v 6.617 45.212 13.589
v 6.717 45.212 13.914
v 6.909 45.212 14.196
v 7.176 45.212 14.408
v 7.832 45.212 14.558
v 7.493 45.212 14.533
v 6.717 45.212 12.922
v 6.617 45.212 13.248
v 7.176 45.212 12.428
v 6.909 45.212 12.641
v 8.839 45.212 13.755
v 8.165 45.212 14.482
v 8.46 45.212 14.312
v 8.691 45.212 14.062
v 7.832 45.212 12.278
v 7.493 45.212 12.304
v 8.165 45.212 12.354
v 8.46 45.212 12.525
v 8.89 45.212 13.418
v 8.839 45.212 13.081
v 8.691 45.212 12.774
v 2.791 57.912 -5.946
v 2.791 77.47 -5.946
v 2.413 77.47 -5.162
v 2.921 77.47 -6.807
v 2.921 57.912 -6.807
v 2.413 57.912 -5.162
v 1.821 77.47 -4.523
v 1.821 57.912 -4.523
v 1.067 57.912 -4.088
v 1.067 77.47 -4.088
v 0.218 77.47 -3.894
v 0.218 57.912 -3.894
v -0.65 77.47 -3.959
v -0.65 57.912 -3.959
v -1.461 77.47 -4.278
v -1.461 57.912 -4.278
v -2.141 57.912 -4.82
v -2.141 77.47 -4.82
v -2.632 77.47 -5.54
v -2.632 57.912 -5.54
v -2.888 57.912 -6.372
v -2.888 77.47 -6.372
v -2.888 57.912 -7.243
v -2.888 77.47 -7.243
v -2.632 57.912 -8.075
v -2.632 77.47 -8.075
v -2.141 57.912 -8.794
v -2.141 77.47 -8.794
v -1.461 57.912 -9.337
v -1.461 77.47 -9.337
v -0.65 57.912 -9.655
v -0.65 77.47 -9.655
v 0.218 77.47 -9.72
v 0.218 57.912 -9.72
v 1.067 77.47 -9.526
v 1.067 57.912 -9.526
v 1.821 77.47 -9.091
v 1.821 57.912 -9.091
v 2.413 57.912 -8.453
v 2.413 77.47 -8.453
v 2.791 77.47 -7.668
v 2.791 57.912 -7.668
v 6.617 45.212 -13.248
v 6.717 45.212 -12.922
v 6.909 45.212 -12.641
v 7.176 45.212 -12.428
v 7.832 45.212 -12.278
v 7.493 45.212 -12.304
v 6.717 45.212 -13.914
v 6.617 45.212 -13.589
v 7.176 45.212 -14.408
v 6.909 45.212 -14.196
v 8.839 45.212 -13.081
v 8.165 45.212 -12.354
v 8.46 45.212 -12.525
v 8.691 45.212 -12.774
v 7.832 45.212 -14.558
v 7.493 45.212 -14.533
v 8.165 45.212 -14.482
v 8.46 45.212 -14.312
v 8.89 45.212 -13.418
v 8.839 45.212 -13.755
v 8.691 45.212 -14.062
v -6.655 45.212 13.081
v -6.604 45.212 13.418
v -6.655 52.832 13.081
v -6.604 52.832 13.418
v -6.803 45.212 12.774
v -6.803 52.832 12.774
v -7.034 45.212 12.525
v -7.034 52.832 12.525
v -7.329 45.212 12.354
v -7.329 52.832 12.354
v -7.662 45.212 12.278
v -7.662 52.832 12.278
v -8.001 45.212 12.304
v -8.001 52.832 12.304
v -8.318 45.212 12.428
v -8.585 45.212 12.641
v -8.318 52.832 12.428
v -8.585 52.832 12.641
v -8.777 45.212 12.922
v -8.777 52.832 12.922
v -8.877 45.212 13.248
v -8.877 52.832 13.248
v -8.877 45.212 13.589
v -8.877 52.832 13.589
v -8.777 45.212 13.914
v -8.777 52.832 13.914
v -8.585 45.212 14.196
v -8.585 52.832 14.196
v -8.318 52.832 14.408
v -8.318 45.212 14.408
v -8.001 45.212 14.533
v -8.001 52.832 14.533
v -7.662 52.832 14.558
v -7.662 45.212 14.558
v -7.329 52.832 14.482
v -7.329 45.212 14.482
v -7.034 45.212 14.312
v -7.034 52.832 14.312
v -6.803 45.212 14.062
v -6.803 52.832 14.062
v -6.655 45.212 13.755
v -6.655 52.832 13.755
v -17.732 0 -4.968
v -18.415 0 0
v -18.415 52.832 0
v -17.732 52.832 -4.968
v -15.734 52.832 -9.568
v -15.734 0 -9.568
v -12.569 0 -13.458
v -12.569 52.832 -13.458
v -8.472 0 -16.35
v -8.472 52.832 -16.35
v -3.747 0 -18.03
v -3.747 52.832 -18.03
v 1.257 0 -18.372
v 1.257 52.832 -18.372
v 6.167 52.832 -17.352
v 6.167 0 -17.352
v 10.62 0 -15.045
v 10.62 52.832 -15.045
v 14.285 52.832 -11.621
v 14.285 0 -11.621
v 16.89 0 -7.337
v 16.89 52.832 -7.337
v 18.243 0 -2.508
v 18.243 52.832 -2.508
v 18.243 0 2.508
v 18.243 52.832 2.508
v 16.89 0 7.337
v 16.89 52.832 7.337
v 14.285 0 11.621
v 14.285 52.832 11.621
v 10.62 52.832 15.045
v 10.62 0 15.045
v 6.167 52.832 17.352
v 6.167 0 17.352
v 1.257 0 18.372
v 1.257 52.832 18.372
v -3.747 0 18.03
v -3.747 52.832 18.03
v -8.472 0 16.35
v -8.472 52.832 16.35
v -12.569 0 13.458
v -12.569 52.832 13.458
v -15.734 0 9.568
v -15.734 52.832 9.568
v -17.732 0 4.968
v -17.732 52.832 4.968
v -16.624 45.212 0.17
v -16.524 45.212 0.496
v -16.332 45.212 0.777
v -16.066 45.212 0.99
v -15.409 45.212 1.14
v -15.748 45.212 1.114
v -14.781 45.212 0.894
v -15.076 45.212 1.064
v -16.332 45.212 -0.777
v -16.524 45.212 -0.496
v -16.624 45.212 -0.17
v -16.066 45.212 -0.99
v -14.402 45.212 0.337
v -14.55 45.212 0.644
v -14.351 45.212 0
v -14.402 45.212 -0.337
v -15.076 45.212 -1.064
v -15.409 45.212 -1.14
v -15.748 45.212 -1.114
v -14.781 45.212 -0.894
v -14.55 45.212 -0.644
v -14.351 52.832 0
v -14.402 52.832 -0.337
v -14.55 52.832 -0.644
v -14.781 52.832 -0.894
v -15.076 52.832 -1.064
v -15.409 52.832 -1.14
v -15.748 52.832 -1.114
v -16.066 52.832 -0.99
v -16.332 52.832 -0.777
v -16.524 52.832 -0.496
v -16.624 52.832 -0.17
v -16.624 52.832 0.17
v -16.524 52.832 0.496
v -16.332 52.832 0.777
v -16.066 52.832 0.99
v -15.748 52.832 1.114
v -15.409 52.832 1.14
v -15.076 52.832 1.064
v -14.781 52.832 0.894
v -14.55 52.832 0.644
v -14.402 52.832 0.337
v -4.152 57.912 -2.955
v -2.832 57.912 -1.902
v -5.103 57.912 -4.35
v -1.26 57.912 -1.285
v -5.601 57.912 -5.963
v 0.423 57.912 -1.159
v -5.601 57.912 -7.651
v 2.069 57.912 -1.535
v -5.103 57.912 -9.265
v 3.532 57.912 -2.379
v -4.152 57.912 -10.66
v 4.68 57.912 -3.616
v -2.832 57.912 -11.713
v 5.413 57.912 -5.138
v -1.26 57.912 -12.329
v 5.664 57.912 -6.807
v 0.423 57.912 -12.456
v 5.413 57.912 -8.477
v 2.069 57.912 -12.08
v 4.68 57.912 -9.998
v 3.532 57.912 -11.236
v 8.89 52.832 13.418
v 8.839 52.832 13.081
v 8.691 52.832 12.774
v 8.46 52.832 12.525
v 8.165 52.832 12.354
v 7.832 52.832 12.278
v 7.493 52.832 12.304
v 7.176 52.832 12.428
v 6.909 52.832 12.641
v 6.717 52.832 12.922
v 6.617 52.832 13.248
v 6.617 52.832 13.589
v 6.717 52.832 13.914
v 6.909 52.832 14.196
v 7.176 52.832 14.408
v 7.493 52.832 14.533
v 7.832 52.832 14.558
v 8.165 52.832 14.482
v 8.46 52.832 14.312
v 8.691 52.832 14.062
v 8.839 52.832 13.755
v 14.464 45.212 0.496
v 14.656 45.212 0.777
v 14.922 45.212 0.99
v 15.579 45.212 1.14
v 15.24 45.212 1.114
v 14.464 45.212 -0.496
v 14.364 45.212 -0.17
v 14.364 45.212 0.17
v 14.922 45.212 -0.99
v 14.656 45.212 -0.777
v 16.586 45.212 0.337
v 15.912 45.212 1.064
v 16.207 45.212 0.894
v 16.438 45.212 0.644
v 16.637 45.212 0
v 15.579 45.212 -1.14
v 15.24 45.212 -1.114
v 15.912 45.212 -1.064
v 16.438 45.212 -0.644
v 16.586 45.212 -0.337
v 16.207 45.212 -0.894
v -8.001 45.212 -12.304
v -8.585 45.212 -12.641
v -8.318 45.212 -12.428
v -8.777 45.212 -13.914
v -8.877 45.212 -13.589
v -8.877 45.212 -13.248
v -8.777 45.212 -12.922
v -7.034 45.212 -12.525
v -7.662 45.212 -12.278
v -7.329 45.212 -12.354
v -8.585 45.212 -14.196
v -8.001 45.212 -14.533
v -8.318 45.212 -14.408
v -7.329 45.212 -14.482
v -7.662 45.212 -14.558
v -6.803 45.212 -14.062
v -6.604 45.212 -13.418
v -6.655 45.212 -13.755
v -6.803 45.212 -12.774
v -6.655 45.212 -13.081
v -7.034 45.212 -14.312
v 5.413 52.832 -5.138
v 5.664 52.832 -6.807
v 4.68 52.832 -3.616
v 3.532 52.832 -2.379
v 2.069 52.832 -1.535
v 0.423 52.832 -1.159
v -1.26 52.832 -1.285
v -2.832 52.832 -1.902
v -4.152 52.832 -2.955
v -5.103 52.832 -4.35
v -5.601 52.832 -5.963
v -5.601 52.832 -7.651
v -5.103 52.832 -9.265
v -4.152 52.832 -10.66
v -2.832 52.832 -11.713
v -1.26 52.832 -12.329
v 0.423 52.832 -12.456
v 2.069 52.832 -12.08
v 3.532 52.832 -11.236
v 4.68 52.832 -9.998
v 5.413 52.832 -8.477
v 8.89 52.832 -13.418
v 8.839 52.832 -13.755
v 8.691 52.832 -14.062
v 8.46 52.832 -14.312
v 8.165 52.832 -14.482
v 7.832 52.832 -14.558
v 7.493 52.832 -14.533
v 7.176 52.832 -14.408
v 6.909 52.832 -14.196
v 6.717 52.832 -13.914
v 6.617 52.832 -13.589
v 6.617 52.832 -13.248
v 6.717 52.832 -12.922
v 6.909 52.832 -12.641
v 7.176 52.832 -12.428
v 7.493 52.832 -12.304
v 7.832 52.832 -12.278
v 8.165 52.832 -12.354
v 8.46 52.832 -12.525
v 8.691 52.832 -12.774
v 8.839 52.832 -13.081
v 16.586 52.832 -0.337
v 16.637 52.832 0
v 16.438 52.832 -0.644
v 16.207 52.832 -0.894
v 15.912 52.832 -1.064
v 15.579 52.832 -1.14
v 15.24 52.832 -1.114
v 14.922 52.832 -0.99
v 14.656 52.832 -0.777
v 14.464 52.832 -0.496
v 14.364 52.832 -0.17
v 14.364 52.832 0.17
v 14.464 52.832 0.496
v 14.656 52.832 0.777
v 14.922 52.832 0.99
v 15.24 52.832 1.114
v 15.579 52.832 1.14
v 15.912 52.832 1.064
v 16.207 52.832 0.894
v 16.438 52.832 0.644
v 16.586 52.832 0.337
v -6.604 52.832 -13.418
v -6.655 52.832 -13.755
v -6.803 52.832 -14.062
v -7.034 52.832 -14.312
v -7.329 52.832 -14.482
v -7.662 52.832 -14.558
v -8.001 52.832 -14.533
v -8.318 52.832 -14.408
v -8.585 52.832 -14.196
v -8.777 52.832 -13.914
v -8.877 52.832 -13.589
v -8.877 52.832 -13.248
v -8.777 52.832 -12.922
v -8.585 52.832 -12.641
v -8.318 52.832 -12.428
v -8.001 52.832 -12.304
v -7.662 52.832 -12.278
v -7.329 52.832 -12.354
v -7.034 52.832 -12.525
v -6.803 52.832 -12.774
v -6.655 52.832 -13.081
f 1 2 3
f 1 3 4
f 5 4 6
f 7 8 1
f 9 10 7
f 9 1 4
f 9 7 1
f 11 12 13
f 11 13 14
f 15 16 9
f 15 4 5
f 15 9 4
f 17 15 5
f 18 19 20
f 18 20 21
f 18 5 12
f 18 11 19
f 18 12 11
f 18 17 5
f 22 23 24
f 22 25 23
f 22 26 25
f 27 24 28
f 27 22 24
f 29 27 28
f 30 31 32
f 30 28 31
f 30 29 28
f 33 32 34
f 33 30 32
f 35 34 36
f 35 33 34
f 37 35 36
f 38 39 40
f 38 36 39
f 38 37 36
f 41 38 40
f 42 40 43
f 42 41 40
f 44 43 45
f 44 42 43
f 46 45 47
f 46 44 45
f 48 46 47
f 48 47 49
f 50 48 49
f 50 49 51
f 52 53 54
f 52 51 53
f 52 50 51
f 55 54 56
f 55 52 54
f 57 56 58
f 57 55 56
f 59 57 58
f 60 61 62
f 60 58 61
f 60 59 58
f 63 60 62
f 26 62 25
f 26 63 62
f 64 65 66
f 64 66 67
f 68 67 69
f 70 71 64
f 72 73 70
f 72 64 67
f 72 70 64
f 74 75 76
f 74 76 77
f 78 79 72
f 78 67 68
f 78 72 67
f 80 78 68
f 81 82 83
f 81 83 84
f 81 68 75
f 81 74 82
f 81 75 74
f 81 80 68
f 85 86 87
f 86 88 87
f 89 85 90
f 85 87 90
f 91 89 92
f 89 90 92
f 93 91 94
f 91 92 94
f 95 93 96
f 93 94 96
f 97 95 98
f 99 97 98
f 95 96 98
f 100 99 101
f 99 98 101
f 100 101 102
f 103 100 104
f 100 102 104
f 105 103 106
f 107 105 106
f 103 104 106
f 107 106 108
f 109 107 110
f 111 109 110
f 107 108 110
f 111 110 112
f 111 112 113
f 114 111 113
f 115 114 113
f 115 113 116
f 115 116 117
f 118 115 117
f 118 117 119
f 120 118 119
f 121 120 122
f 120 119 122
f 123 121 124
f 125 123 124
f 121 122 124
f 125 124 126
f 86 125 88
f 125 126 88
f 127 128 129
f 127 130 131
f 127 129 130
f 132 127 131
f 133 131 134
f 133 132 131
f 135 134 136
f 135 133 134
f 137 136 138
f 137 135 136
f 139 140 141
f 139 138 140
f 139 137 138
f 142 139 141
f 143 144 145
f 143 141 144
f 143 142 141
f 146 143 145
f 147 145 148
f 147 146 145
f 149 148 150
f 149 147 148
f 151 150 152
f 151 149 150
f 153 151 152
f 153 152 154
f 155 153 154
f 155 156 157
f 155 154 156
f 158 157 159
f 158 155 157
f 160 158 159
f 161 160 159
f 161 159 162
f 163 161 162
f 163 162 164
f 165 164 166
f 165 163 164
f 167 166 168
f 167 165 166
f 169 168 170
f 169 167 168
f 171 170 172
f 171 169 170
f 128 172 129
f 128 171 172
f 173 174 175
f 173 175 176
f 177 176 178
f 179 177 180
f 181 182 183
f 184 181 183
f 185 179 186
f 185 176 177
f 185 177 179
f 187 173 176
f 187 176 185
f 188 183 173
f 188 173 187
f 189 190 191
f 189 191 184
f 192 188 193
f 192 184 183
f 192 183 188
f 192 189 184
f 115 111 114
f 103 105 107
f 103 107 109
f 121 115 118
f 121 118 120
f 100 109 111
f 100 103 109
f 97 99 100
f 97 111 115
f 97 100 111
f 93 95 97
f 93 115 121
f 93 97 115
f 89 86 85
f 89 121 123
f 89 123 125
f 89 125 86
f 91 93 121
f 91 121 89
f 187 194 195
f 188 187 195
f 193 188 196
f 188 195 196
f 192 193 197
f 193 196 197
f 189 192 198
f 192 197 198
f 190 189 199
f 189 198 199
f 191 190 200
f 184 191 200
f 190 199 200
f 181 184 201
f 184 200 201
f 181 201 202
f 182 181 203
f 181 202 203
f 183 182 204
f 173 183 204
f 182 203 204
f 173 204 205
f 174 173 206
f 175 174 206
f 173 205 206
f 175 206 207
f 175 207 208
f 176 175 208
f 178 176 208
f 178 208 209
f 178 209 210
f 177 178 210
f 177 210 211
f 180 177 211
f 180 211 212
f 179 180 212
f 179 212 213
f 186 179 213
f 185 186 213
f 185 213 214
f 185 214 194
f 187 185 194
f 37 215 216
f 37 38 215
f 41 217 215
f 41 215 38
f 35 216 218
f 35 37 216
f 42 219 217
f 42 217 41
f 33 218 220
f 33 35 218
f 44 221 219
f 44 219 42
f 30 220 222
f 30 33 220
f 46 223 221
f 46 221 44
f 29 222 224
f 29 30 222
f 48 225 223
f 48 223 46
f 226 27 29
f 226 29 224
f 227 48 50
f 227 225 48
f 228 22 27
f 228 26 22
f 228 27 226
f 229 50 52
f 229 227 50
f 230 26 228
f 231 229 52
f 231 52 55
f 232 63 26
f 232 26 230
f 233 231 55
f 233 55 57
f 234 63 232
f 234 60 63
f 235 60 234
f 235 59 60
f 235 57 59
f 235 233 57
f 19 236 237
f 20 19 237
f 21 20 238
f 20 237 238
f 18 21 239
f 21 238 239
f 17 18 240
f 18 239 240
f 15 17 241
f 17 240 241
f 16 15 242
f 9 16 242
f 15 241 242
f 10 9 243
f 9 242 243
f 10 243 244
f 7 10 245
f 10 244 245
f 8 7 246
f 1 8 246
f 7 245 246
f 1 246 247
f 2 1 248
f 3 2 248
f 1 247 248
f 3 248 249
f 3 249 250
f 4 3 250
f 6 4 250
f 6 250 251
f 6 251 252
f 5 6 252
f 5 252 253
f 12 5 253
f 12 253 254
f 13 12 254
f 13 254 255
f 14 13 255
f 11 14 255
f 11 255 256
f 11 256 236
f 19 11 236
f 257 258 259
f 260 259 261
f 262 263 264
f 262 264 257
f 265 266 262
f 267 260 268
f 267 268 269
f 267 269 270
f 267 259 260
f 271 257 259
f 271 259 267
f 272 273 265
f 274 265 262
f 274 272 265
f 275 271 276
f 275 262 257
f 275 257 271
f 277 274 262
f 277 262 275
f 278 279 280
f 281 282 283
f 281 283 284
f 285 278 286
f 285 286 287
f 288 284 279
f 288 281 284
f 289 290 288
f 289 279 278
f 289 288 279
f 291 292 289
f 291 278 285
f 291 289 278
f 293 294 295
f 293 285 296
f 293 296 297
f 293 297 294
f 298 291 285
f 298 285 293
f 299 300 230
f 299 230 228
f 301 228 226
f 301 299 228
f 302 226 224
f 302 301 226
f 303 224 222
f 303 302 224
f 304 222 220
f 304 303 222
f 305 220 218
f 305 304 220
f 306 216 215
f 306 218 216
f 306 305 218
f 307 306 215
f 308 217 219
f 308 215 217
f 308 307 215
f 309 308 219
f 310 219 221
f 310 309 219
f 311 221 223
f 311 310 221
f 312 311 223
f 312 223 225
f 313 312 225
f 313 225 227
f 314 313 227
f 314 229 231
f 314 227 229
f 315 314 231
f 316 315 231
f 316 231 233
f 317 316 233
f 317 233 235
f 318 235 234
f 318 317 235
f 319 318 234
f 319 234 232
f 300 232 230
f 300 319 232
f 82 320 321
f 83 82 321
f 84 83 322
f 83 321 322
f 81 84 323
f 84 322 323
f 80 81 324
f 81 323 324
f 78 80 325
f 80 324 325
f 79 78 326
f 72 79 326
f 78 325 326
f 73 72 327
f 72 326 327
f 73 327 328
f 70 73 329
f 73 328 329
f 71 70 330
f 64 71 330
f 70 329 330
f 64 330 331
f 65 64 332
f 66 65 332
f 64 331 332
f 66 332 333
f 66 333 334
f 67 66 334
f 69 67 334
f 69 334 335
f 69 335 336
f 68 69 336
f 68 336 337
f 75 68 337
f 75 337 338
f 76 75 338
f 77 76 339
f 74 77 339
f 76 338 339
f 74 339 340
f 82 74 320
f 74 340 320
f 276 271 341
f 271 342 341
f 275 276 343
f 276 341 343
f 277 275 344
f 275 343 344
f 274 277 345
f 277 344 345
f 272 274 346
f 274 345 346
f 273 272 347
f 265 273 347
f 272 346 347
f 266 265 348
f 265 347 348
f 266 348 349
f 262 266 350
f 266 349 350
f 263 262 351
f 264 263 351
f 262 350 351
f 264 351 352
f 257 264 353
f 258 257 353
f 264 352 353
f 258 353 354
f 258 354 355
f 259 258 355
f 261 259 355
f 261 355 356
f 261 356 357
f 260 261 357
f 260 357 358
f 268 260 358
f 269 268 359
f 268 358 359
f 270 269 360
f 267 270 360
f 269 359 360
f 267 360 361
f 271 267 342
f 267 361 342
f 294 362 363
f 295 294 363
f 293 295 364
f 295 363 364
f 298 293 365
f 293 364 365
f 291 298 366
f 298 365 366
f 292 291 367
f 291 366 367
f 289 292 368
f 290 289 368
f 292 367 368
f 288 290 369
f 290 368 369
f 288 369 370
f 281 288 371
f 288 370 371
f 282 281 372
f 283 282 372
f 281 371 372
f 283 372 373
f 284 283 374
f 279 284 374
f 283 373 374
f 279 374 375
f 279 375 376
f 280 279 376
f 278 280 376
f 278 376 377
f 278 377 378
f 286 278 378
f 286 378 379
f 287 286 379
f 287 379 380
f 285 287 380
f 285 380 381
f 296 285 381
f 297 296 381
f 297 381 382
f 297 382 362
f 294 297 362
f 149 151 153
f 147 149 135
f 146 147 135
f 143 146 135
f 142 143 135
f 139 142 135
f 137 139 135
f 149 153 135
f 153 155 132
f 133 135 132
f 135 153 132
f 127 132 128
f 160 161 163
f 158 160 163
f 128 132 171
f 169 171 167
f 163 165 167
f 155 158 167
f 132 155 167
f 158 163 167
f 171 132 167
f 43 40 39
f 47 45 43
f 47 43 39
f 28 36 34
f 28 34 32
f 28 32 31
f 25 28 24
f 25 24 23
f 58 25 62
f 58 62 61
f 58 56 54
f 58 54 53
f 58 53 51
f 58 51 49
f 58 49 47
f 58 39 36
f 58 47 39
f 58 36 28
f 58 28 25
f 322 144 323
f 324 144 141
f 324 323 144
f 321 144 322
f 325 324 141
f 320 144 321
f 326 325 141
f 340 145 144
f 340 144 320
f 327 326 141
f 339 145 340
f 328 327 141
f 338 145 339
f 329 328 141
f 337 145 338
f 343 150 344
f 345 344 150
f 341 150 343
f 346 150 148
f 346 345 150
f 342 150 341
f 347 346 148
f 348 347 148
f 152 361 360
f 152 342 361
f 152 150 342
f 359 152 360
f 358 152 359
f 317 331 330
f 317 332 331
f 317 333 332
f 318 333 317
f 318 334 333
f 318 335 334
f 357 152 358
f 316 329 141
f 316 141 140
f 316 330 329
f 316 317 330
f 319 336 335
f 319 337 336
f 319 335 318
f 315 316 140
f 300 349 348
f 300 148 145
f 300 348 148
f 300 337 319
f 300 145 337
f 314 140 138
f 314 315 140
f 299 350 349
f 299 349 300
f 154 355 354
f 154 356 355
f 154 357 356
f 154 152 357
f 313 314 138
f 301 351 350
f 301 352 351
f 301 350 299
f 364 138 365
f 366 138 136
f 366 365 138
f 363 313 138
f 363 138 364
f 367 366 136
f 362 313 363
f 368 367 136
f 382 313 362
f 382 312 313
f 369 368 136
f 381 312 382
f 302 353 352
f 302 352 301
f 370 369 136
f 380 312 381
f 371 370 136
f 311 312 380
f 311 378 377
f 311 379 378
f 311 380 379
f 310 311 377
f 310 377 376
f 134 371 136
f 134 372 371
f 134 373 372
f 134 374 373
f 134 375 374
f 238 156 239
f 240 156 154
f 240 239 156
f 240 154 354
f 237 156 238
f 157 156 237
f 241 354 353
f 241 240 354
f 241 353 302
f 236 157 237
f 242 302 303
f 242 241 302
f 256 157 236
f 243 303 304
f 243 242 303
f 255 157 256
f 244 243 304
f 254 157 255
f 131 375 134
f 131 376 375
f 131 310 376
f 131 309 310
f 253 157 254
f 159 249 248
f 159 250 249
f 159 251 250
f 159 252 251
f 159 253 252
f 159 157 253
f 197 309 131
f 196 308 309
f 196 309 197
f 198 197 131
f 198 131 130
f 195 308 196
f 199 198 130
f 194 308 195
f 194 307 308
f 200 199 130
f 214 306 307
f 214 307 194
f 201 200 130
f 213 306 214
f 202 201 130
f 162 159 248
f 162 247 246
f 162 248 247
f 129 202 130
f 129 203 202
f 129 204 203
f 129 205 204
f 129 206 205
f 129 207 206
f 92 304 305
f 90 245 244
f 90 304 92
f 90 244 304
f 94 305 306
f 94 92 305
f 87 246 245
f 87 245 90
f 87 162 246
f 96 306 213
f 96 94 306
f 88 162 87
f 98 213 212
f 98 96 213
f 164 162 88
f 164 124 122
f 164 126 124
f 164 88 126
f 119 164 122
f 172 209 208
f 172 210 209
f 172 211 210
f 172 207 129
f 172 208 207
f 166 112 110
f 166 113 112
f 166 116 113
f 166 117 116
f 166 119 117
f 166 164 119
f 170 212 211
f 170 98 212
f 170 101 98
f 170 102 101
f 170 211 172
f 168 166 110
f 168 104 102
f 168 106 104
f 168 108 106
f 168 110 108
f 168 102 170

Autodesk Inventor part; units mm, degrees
ref_plane "YZ Plane" through (0, 0, 0) normal (1, 0, 0) x (0, 1, 0)
ref_plane "XZ Plane" through (0, 0, 0) normal (0, 1, 0) x (-1, 0, 0)
ref_plane "XY Plane" through (0, 0, 0) normal (0, 0, 1) x (1, 0, 0)
sketch "Sketch1" plane through (0, 0, 0) normal (0, 1, 0) x (-1, 0, 0)
  circle A0 centre (0, 0) radius 18.415
  dimension "d0" = 36.83
extrude "Extrusion1" add sketch "Sketch1" along normal blind 52.832
sketch "Sketch2" plane through (0, 52.832, 0) normal (0, 1, 0) x (1, 0, 0)
  circle A0 centre (0, 6.8072) radius 5.6642
  line L0 (-18.3795, 1.143) -> (18.3795, 1.143) construction
  circle A1 centre (0, 0) radius 18.415 projected
  line L1 (-28.9381, -18.415) -> (33.3416, -18.415) construction
  circle A2 centre (0, 0) radius 18.415 projected
  dimension "d3" = 11.3284
  dimension "d10" = 19.558
extrude "Extrusion2" add sketch "Sketch2" along normal blind 5.08 contours A0
sketch "Sketch3" plane through (0, 57.912, -6.8072) normal (0, 1, 0) x (1, 0, 0)
  circle A0 centre (0, 0) radius 2.921
  point P0 (0, -6.8072)
  dimension "d6" = 5.842
extrude "Extrusion3" add sketch "Sketch3" along normal blind 19.558
sketch "Sketch4" plane through (0, 52.832, 0) normal (0, 1, 0) x (1, 0, 0)
  circle A0 centre (-7.747, 13.4182) radius 1.143
  circle A1 centre (0, 6.8072) radius 5.6642 projected
  circle A2 centre (0, 0) radius 18.415 projected
  circle A3 centre (-15.494, 0) radius 1.143
  circle A4 centre (-7.747, -13.4182) radius 1.143
  circle A5 centre (7.747, -13.4182) radius 1.143
  circle A6 centre (15.494, 0) radius 1.143
  circle A7 centre (7.747, 13.4182) radius 1.143
  circle A8 centre (0, 0) radius 18.415 projected
  line L0 (0, 0) -> (-16.637, 0) construction
  line L1 (-18.415, 3.3425) -> (-18.415, -3.4032) construction
  dimension "d11" = 2.286
  dimension "d14" = 360
  dimension "d16" = 1.778
extrude "Extrusion4" cut sketch "Sketch4" against normal blind 7.62 contours A0 | A3 | A4 | A5 | A6 | A7
properties part number "DC 12V 200RPM"
